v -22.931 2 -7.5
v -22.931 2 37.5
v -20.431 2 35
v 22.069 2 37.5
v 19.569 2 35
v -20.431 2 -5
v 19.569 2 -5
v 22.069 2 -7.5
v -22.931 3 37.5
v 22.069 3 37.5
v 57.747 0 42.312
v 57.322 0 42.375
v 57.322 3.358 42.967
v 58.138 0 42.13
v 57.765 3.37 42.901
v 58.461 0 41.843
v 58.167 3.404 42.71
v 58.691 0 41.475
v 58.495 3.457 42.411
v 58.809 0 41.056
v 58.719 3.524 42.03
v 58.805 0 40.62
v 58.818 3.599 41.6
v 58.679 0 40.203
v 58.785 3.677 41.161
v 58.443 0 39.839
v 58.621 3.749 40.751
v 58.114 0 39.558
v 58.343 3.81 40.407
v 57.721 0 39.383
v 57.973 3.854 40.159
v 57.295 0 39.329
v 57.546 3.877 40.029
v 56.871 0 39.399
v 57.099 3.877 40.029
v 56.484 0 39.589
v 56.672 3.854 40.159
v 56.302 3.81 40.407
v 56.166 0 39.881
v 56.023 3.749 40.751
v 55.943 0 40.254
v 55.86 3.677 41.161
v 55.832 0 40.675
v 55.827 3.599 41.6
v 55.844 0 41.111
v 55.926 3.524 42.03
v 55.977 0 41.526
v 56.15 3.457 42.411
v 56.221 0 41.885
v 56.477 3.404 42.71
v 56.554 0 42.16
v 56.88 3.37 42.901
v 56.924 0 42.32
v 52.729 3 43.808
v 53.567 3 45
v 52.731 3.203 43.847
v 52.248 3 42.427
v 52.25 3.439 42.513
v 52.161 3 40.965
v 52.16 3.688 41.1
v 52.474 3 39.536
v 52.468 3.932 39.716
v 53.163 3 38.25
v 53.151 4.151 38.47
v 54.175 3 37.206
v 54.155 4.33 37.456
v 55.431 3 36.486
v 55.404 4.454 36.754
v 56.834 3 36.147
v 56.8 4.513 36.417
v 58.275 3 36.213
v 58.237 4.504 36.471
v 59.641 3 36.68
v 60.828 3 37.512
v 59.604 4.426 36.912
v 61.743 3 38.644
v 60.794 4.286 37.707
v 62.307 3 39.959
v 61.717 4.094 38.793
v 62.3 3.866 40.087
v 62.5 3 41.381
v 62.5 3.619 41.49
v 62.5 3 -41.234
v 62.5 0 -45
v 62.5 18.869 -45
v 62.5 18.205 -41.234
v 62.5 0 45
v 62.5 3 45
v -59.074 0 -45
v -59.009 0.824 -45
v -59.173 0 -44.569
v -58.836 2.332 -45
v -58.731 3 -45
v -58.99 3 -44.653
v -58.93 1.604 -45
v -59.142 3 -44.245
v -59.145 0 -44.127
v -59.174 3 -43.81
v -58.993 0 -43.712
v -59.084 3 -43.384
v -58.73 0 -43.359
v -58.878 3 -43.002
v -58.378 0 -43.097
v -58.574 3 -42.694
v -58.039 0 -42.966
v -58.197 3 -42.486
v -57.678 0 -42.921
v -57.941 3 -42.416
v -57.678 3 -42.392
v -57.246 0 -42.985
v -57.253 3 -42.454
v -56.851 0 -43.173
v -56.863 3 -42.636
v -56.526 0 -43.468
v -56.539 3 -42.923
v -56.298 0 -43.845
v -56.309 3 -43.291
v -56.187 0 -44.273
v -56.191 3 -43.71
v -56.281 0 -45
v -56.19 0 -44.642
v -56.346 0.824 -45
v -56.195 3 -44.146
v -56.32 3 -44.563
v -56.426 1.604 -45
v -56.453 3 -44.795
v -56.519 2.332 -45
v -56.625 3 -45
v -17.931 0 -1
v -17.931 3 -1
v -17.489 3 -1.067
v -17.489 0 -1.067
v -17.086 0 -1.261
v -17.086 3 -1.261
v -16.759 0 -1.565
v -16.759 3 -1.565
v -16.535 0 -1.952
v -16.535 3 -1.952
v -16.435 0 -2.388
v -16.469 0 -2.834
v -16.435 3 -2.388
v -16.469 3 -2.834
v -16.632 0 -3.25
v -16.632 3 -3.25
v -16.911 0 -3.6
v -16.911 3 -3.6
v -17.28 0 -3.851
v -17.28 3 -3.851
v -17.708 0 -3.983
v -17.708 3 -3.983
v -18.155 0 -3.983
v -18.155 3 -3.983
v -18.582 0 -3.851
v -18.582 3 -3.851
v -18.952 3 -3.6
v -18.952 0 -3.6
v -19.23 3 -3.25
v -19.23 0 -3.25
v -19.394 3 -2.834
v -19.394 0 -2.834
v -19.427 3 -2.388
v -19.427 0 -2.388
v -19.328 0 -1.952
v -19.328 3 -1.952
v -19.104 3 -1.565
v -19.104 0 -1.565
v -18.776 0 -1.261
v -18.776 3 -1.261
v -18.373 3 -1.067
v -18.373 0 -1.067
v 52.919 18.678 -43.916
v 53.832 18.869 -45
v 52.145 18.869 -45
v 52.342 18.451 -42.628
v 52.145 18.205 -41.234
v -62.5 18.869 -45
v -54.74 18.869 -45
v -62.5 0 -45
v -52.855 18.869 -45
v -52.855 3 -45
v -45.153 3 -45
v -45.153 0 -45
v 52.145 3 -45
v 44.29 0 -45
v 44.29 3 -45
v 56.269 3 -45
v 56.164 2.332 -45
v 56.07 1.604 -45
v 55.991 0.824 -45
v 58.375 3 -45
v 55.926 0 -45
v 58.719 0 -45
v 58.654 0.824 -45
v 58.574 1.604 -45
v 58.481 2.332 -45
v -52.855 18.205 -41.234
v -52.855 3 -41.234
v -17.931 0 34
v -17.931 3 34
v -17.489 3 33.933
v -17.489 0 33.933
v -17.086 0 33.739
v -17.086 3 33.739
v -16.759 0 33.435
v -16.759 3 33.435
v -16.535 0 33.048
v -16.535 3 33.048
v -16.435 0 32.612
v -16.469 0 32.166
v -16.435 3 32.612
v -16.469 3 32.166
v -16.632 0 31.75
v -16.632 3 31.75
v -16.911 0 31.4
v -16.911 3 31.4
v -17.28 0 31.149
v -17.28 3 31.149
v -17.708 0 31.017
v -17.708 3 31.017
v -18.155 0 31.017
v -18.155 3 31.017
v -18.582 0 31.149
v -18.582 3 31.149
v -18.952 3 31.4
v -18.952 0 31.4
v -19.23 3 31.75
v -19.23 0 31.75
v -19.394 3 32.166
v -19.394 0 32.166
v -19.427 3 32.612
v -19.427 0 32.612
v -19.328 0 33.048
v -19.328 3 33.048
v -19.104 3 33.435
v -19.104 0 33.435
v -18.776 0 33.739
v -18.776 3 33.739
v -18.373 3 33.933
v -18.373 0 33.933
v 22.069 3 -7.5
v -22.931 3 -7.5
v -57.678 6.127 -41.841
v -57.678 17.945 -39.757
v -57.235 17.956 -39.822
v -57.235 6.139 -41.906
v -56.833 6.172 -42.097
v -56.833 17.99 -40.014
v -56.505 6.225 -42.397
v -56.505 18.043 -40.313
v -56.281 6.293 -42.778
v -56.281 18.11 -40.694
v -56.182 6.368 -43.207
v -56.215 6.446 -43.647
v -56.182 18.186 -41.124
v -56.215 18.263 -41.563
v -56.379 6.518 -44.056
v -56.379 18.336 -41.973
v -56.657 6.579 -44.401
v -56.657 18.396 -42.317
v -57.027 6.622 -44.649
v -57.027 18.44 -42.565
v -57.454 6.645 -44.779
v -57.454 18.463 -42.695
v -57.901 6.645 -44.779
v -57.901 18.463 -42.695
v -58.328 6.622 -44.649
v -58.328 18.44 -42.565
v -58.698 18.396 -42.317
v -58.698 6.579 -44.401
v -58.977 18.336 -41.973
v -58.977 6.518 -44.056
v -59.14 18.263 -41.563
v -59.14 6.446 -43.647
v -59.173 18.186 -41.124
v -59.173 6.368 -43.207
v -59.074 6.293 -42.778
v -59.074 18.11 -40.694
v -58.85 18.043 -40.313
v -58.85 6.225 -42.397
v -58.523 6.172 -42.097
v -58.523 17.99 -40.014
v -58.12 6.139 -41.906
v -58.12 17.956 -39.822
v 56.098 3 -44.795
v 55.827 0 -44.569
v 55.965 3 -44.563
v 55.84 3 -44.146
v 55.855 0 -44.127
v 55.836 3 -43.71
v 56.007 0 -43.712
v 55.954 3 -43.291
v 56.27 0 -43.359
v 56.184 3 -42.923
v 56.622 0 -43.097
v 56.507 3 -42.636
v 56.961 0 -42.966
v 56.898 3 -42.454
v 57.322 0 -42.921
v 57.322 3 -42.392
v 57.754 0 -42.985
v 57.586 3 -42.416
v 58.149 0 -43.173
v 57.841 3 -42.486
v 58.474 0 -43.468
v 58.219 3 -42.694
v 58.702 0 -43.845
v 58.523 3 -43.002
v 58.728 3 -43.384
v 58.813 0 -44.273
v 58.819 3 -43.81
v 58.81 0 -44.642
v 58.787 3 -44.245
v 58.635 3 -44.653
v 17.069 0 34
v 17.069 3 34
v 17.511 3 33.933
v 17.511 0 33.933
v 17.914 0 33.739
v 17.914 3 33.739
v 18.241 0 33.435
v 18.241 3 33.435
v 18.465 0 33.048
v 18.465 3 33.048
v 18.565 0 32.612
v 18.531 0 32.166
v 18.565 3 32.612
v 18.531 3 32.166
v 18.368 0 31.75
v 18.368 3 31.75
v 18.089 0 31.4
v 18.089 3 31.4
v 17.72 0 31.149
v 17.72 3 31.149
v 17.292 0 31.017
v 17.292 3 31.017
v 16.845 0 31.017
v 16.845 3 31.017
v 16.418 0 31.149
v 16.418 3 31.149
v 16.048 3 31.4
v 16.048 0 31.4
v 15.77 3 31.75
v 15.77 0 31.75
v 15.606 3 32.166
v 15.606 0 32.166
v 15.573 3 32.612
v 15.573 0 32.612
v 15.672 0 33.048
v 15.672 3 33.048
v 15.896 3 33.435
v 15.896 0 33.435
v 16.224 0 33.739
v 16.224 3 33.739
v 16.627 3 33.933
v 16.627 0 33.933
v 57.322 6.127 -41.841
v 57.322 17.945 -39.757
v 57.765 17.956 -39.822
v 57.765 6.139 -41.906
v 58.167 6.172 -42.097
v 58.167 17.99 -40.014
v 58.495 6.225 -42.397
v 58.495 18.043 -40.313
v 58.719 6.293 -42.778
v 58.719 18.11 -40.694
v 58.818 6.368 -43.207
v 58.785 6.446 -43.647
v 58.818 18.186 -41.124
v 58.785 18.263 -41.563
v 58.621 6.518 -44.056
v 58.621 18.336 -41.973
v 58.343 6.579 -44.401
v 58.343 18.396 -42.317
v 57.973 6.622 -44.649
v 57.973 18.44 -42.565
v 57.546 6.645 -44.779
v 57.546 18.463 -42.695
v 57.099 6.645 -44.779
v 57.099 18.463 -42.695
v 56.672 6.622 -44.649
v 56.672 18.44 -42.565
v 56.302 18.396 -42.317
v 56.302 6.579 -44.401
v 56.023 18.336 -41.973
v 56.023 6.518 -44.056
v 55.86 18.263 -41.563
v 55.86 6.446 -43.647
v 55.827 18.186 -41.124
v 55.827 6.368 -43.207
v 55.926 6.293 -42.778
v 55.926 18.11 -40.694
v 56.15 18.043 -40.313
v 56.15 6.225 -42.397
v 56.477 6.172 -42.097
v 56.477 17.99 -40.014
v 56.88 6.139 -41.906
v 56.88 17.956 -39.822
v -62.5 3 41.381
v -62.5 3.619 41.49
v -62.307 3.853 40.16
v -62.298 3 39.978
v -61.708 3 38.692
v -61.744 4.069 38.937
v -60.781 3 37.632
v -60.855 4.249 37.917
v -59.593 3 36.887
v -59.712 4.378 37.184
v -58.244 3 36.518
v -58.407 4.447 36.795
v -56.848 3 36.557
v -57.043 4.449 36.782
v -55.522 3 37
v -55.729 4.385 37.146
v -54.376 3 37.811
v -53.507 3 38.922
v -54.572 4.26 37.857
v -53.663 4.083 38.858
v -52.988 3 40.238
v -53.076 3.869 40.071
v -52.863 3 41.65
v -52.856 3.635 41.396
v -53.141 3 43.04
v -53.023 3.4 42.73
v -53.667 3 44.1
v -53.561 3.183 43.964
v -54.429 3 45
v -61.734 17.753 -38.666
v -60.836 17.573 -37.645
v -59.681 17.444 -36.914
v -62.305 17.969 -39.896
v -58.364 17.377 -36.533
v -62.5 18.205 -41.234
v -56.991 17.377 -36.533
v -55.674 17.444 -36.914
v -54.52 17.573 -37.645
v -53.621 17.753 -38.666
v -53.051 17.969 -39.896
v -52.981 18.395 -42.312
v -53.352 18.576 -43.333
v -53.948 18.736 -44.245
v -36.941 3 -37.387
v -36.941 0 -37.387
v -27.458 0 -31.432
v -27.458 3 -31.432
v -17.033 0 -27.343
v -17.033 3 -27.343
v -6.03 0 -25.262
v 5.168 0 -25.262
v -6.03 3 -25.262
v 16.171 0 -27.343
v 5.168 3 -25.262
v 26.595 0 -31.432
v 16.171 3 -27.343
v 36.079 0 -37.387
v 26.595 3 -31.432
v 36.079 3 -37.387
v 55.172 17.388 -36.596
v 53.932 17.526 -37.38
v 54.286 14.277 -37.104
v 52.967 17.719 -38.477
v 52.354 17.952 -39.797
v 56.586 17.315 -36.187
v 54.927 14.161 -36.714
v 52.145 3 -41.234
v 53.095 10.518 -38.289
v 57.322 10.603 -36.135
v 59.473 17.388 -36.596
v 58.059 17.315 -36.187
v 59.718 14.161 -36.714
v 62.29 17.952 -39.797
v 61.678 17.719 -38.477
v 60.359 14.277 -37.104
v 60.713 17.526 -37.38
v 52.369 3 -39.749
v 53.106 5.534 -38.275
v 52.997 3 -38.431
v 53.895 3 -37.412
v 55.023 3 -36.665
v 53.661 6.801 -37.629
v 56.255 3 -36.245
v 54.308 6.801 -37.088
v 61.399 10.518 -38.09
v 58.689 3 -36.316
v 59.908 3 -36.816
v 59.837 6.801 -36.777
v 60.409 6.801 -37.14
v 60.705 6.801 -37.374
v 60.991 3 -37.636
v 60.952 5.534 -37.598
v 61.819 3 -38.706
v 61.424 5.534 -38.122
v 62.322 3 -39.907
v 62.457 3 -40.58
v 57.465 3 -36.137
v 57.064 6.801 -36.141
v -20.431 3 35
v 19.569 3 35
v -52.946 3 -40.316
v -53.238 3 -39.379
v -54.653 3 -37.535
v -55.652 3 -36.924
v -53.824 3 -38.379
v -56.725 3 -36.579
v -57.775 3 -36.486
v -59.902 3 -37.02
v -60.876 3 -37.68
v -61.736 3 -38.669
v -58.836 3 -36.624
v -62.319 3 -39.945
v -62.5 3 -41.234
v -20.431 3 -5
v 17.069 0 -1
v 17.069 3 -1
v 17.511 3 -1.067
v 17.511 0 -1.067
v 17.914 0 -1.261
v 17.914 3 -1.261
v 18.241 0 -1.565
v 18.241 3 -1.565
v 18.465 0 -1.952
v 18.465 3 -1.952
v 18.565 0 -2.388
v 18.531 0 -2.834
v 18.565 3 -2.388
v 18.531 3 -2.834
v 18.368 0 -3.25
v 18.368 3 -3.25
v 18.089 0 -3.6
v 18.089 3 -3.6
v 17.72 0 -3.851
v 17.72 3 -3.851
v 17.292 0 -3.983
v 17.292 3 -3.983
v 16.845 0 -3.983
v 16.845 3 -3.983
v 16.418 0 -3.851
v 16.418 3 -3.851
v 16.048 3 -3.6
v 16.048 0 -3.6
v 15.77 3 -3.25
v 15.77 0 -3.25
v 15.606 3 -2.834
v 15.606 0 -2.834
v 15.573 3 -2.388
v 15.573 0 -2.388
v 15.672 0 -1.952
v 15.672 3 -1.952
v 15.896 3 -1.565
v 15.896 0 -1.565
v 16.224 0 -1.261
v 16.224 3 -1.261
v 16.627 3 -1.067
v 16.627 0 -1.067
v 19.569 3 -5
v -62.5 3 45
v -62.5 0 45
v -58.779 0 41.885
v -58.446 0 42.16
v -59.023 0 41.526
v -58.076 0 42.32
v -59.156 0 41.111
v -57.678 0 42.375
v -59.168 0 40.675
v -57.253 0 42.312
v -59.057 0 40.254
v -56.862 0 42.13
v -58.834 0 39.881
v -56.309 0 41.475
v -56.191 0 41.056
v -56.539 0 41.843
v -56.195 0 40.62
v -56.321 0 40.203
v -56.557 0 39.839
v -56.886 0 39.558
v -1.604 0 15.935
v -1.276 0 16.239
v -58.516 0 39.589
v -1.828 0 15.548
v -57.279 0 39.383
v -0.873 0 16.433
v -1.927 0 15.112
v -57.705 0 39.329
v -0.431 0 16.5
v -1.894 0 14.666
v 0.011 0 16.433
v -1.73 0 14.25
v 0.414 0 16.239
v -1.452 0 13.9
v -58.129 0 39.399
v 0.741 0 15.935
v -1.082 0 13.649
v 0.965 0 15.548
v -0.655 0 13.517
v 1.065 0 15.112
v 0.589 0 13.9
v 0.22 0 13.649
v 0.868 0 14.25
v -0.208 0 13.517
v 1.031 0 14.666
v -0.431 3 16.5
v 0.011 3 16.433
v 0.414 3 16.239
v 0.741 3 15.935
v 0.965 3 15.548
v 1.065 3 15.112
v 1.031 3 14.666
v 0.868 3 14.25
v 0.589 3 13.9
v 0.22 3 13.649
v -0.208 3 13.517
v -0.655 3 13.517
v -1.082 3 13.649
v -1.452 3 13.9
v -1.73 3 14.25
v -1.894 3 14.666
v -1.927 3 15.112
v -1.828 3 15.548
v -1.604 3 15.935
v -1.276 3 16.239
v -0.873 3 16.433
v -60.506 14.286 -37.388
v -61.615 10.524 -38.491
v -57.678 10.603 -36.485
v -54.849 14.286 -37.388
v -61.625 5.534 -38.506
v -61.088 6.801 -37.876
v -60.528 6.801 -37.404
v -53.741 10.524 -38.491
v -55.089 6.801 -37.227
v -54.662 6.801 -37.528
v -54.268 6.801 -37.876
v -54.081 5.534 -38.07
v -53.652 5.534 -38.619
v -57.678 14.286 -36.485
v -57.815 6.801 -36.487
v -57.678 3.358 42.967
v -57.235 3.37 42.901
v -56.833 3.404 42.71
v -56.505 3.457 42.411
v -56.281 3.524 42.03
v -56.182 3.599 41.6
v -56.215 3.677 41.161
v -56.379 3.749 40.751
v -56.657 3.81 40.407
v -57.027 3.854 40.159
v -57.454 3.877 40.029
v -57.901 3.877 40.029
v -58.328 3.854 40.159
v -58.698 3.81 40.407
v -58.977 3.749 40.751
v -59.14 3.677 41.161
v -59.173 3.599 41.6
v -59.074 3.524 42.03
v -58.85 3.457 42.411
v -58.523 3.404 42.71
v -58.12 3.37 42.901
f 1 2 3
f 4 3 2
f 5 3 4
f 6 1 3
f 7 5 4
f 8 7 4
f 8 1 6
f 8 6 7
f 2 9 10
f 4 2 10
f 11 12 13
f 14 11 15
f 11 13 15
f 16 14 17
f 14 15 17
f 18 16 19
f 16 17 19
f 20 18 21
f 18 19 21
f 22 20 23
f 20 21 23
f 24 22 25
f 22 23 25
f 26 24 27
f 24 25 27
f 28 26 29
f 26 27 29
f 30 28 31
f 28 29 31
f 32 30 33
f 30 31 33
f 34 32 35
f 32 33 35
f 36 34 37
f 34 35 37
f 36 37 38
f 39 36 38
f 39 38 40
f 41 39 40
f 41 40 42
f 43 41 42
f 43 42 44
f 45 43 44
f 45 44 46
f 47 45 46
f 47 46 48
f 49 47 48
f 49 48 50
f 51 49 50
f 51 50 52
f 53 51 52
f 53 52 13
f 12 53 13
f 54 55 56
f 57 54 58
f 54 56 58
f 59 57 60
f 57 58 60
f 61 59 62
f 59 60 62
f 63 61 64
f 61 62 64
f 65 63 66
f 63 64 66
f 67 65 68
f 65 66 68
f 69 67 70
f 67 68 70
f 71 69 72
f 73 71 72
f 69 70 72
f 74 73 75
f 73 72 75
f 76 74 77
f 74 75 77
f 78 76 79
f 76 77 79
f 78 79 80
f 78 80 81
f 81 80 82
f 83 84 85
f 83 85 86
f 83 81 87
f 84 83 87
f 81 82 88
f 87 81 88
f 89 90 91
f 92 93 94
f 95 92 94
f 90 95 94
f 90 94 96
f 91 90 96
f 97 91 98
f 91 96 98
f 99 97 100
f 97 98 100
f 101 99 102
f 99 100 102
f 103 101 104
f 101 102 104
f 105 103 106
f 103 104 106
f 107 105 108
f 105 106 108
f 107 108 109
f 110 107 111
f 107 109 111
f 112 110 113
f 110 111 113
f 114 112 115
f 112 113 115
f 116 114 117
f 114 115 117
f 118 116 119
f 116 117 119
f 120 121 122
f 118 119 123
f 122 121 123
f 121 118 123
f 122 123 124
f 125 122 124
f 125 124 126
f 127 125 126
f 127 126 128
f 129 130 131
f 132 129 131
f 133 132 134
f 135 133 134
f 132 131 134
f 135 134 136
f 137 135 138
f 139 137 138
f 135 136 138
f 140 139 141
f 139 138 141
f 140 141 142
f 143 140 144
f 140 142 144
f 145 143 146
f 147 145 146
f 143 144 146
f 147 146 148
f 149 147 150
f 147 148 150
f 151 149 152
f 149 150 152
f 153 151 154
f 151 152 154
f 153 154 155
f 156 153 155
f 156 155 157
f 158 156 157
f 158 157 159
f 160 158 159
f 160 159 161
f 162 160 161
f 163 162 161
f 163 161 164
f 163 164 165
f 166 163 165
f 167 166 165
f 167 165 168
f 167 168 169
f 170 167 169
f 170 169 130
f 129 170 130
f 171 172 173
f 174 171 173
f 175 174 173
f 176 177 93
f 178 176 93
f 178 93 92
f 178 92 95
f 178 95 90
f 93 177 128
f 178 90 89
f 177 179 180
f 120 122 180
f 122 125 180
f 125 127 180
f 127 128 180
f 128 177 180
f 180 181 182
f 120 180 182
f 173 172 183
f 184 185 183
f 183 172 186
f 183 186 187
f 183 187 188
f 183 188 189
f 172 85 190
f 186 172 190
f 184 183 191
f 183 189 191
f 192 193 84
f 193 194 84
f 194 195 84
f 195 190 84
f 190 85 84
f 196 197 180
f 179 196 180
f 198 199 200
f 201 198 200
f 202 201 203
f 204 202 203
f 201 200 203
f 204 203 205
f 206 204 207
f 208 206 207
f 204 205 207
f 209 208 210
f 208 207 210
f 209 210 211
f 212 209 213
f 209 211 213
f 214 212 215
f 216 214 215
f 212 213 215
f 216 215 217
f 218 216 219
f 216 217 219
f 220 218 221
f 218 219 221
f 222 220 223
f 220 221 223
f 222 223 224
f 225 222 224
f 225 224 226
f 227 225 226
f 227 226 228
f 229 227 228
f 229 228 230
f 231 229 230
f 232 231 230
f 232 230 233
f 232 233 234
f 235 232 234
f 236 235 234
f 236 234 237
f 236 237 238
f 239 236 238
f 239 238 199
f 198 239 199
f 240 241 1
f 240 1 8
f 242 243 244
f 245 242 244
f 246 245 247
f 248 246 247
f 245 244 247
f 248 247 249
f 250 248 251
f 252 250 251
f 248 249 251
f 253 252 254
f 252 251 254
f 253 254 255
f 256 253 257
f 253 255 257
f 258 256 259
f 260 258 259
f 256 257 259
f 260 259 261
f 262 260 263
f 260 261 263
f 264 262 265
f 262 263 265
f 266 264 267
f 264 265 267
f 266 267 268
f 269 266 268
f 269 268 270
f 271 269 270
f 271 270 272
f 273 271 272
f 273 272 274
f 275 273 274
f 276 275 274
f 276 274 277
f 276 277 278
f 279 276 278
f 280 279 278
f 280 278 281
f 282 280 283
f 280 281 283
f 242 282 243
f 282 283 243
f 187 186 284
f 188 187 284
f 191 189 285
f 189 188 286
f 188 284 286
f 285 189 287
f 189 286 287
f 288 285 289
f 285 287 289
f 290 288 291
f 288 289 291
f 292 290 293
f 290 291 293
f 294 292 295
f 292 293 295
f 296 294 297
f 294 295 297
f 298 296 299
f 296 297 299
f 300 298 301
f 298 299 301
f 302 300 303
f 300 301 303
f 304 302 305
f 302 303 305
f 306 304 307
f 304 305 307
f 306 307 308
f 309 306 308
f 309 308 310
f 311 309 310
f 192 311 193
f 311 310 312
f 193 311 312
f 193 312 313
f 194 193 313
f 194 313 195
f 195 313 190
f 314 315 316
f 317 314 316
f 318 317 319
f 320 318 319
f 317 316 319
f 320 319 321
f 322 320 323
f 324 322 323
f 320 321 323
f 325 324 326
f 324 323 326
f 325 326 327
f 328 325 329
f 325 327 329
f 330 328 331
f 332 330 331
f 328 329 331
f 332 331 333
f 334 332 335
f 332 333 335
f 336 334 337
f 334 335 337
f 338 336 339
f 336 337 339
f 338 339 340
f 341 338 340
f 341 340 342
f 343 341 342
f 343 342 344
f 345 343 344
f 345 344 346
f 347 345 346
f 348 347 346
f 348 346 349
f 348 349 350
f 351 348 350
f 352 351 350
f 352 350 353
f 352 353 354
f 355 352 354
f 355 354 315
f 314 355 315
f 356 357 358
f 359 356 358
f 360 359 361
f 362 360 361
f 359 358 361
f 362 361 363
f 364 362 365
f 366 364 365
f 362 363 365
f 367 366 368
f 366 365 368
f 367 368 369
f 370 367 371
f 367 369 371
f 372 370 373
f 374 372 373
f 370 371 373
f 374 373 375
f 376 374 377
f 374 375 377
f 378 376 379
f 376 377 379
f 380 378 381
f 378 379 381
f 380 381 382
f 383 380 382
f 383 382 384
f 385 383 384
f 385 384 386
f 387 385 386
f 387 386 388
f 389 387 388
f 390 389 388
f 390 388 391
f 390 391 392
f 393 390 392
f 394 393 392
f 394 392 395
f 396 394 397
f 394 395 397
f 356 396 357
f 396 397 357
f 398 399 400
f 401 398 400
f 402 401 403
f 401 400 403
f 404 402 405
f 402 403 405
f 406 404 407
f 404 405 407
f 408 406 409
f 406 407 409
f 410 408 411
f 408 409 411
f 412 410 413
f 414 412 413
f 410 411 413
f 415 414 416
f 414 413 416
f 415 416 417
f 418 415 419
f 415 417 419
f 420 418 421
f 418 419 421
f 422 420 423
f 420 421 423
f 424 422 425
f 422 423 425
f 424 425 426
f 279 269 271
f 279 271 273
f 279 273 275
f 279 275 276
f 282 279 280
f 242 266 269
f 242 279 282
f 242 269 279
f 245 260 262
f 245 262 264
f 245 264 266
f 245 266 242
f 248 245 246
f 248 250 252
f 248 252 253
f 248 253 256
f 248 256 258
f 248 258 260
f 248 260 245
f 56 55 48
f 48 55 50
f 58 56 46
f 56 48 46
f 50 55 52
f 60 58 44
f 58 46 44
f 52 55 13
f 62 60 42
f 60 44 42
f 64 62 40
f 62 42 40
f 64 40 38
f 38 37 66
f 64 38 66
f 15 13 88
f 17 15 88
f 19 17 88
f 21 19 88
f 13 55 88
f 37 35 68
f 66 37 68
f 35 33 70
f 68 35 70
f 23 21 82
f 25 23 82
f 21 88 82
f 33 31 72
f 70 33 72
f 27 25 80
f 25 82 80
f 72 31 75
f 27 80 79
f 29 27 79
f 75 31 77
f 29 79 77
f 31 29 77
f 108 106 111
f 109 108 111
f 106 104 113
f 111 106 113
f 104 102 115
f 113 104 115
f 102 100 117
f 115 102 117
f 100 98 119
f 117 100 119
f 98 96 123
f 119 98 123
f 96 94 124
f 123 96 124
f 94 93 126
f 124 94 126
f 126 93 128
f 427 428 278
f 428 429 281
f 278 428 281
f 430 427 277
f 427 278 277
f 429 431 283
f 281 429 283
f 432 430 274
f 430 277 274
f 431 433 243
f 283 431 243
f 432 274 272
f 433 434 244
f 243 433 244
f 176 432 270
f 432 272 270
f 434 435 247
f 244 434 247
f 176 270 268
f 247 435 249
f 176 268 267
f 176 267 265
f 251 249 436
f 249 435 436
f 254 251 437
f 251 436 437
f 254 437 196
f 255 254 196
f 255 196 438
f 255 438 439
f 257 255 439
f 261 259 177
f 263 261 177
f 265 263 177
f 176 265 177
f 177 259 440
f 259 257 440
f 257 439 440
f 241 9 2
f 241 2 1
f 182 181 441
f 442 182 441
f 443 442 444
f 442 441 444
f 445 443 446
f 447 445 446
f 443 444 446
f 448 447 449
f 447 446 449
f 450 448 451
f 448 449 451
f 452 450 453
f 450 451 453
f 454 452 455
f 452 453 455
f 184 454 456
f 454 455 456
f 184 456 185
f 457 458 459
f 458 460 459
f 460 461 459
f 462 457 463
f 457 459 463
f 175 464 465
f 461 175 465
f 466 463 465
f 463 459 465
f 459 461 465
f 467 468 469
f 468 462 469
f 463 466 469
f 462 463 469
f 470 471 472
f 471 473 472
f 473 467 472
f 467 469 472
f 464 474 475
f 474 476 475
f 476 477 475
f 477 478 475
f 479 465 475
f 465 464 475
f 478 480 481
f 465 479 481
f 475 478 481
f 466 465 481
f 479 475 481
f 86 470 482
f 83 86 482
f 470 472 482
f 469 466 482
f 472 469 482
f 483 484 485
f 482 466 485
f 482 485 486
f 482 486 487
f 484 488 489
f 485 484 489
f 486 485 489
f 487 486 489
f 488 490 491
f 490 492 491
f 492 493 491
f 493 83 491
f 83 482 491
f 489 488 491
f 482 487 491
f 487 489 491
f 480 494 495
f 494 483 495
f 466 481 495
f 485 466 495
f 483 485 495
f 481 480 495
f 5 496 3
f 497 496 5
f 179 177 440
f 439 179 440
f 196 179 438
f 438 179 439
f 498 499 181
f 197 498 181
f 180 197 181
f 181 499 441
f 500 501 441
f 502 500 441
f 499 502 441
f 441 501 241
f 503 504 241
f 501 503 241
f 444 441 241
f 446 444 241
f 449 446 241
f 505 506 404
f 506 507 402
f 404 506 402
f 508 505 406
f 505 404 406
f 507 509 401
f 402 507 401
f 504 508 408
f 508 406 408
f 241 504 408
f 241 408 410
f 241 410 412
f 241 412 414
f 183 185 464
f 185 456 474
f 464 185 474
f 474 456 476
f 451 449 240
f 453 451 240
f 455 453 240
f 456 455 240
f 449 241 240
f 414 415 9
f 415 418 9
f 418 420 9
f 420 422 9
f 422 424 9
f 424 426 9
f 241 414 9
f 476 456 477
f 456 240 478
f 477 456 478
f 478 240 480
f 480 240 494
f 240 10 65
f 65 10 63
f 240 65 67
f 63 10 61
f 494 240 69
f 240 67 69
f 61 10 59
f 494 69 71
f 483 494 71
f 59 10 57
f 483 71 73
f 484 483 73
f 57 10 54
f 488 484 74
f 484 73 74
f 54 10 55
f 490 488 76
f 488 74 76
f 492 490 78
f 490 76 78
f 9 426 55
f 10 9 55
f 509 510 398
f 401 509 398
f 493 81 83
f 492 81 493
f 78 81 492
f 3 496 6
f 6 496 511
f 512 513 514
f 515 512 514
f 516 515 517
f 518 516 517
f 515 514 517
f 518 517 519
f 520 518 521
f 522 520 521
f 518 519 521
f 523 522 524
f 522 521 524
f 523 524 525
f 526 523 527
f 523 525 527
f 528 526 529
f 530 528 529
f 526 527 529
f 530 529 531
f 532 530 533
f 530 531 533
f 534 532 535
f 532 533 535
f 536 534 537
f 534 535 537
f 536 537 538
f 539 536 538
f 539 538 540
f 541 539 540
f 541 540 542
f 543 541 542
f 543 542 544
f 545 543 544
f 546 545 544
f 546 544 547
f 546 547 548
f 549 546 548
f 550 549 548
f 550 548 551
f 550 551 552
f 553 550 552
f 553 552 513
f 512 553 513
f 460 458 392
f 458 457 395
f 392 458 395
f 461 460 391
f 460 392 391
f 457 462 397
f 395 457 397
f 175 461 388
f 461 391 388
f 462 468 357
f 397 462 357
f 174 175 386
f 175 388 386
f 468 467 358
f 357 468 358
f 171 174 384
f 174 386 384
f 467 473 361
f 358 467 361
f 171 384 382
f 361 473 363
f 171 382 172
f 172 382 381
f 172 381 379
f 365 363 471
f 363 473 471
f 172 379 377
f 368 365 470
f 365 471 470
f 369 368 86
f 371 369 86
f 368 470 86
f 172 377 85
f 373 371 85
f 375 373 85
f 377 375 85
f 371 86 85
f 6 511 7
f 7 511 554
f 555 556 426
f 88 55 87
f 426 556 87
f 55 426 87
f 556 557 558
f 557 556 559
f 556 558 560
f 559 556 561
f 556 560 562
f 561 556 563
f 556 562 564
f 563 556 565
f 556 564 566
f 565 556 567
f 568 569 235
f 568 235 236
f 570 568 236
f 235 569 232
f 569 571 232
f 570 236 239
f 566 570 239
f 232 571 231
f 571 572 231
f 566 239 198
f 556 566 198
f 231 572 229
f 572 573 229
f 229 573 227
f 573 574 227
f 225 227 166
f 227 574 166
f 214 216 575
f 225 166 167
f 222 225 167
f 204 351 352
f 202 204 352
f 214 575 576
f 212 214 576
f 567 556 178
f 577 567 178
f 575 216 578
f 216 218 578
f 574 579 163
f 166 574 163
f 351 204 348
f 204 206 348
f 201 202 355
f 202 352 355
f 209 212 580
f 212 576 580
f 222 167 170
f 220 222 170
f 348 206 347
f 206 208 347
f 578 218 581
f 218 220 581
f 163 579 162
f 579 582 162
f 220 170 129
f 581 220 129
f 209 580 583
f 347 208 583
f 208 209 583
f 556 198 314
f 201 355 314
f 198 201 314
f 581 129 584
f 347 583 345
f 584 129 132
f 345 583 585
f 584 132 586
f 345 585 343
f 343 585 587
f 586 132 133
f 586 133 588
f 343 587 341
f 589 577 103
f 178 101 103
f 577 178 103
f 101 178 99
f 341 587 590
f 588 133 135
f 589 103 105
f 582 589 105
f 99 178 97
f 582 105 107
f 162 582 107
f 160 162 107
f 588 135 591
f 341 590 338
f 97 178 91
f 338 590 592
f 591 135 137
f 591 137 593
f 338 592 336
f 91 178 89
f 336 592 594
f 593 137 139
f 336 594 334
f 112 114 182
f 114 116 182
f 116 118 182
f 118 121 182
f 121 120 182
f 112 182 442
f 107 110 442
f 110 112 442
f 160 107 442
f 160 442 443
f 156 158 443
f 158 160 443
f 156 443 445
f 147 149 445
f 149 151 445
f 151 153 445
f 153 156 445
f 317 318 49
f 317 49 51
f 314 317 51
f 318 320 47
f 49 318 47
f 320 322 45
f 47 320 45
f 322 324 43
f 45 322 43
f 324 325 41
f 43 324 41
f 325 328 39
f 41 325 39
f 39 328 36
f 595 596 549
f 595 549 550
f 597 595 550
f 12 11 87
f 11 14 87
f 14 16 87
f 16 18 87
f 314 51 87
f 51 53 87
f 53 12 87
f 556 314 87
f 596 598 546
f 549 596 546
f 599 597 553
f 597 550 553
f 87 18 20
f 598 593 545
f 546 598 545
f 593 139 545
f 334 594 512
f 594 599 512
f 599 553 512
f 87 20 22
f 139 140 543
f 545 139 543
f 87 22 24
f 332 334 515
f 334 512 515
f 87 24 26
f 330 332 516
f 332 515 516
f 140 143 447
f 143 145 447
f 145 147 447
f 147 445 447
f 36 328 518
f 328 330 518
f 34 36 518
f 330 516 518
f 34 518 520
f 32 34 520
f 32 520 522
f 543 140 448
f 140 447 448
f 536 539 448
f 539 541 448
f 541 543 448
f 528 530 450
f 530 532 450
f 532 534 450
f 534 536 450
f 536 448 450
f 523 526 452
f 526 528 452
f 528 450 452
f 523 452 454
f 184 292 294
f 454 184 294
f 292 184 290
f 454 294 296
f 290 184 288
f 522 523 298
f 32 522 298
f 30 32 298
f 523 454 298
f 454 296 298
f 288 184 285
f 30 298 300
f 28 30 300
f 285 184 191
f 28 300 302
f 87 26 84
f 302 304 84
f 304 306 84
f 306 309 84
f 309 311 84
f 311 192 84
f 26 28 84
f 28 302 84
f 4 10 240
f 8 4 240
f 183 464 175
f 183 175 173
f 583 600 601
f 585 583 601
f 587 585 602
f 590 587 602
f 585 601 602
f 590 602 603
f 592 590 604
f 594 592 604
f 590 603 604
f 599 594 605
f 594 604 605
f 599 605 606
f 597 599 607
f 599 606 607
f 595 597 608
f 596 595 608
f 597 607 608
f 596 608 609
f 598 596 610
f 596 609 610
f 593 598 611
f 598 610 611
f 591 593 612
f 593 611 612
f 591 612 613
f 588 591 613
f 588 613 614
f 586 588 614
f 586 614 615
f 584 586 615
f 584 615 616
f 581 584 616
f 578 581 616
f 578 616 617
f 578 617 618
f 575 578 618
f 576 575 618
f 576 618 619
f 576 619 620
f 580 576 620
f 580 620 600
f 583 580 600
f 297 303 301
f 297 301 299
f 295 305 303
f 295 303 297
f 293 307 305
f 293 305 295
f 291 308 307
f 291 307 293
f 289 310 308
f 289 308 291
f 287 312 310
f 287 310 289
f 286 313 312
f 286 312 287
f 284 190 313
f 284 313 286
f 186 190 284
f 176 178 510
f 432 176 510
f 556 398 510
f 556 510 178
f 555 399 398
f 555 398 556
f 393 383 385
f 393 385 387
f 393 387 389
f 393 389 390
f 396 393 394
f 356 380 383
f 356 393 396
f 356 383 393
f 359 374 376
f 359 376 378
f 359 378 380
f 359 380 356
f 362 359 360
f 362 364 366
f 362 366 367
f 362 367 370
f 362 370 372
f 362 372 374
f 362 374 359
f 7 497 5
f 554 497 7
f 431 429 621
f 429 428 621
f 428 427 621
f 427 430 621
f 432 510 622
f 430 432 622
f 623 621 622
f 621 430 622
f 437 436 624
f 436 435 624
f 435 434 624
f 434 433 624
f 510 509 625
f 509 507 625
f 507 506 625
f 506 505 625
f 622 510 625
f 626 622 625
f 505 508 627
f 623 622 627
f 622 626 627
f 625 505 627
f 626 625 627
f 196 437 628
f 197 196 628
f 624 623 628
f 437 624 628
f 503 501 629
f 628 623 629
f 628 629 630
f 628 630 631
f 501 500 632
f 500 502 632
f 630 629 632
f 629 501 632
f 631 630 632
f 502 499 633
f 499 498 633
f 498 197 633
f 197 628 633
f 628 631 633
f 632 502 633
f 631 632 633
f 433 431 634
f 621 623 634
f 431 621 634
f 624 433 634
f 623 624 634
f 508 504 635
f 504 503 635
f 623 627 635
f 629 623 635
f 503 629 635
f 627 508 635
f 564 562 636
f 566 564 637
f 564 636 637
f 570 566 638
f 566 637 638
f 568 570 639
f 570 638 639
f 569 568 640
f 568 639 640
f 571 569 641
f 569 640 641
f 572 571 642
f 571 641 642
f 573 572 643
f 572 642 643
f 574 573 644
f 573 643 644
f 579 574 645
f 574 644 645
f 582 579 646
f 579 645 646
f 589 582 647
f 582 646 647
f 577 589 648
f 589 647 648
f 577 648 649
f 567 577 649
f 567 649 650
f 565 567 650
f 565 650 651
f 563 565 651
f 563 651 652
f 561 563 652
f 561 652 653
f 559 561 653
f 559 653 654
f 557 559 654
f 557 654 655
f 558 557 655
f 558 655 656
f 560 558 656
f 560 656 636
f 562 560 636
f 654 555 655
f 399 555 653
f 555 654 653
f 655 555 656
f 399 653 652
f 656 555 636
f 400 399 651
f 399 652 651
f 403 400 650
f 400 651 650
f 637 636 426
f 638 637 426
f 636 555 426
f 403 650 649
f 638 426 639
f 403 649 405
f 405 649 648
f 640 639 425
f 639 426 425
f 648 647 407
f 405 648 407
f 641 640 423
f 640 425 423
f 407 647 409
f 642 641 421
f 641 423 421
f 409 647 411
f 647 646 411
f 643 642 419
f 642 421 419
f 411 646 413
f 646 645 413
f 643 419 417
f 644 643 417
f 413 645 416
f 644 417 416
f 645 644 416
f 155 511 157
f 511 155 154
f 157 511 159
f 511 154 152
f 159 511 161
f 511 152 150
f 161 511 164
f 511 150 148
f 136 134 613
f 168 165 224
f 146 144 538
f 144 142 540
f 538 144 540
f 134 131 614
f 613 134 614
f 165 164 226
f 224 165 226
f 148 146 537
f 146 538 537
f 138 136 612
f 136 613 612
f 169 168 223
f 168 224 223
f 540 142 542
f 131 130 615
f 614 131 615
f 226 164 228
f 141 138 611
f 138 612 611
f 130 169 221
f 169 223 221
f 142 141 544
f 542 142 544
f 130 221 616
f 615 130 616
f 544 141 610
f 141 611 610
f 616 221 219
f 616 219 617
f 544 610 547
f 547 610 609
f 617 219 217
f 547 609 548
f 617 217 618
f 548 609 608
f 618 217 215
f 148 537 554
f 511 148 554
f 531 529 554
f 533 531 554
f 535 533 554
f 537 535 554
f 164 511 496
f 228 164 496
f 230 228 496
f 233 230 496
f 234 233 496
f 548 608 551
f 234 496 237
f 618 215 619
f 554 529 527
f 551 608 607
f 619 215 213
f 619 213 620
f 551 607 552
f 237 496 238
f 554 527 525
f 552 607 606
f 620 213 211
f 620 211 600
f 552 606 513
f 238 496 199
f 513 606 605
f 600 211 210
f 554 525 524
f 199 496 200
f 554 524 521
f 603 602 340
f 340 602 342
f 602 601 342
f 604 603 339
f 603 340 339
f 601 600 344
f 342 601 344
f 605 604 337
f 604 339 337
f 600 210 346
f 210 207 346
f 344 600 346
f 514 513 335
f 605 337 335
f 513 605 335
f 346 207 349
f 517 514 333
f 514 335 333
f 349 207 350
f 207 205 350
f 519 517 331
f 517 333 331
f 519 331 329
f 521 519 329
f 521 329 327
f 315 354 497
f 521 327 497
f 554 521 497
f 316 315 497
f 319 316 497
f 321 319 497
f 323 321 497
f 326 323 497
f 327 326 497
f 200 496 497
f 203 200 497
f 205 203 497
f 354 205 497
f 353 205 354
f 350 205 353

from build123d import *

# Parameters (mm, degrees)
SKETCH_1_W                        = 125
SKETCH_1_H                        = 90
EXTRUDE_1_DEPTH                   = 3
EXTRUDE_2_DEPTH                   = 125
SKETCH_4_R                        = 1.5
CUT_EXTRUDE_1_DEPTH               = 79.83849136
CUT_EXTRUDE_2_REACH               = 83.838
CUT_EXTRUDE_2_OFFSET_FROM_SURFACE = 3
SKETCH_7_R                        = 1.5
CUT_EXTRUDE_3_DEPTH               = 79.632618889
SKETCH_8_W                        = 45
SKETCH_8_H                        = 45
SKETCH_8_W_2                      = 40
SKETCH_8_H_2                      = 40
CUT_EXTRUDE_4_DEPTH               = 1
EXTRUDE_5_REACH                   = 80.633
SKETCH_13_R                       = 1.5
CUT_EXTRUDE_6_DEPTH               = 12
SKETCH_14_R                       = 60
CUT_EXTRUDE_11_DEPTH              = 10


with BuildPart() as part:
    # 草图1 → 凸台-拉伸1 (new body)
    with BuildSketch(Plane(origin=(0, 0, 0), x_dir=(1, 0, 0), z_dir=(0, 1, 0))):
        Rectangle(SKETCH_1_W, SKETCH_1_H)
    extrude(amount=EXTRUDE_1_DEPTH)

    # 草图3 → 凸台-拉伸2 (add)
    with BuildSketch(Plane(origin=(62.5, 0, 0), x_dir=(0, 0, -1), z_dir=(1, 0, 0))):
        Polygon((-45, 3), (45, 18.869428264), (45, 3), align=None)
    extrude(amount=-EXTRUDE_2_DEPTH)

    # 草图4 → 切除-拉伸1 (cut, through all)
    with BuildSketch(Plane(origin=(0, 10.604992156, 1.869946247), x_dir=(1, 0, 0), z_dir=(0, 0.9848077530122079, 0.1736481776669313))):
        with Locations(Location((-57.677629218, 43.768927189, 0), (0, 0, 270))):
            Circle(SKETCH_4_R)
        with Locations(Location((-57.677629218, -40.231072811, 0), (0, 0, 270))):
            Circle(SKETCH_4_R)
        with Locations(Location((57.322370782, -40.231072811, 0), (0, 0, 270))):
            Circle(SKETCH_4_R)
        with Locations(Location((57.322370782, 43.768927189, 0), (0, 0, 270))):
            Circle(SKETCH_4_R)
    extrude(amount=-CUT_EXTRUDE_1_DEPTH, mode=Mode.SUBTRACT)

    # 切除-拉伸2: up to this face of the body (flat: up to its plane, moved by the offset)
    cut_extrude_2_end = Plane(part.part.faces().sort_by_distance((0.00039232, 0, -0.011252097))[0]).offset(-CUT_EXTRUDE_2_OFFSET_FROM_SURFACE)
    # 草图6 → 切除-拉伸2 (cut, up to the picked face)
    with BuildSketch(Plane(origin=(0, 10.604992156, 1.869946247), x_dir=(1, 0, 0), z_dir=(0, 0.9848077530122079, 0.1736481776669313)), mode=Mode.PRIVATE) as cut_extrude_2_sk1:
        with BuildLine():
            Line((-62.5, 43.768927189), (-62.5, -40.231072811))
            ThreePointArc((-62.5, -40.231072811), (-55.729394488, -35.819764457), (-54.429429622, -43.795404353))
            Line((-54.429429622, -43.795404353), (53.566923407, -43.795404353))
            ThreePointArc((53.566923407, -43.795404353), (55.403578158, -35.422114588), (62.5, -40.231072811))
            Line((62.5, -40.231072811), (62.5, 43.768927189))
            ThreePointArc((62.5, 43.768927189), (55.232545192, 39.031789517), (53.831757304, 47.592990717))
            Line((53.831757304, 47.592990717), (-54.739637032, 47.592990717))
            ThreePointArc((-54.739637032, 47.592990717), (-55.54606028, 39.44322796), (-62.5, 43.768927189))
        make_face()
    cut_extrude_2_tool1 = split(extrude(cut_extrude_2_sk1.sketch, amount=-CUT_EXTRUDE_2_REACH, mode=Mode.PRIVATE), bisect_by=cut_extrude_2_end, keep=Keep.BOTH, mode=Mode.PRIVATE)
    add(cut_extrude_2_tool1.solids().sort_by(Axis((-0.081778, 10.93222, 0.014148), (0, -0.9848077530122079, -0.1736481776669313)))[0], mode=Mode.SUBTRACT)

    # 草图7 → 切除-拉伸3 (cut, through all)
    with BuildSketch(Plane(origin=(0, 3, 0), x_dir=(1, 0, 0), z_dir=(0, 1, 0))):
        with Locations(Location((-17.931253107, 2.5, 0), (0, 0, 270))):
            Circle(SKETCH_7_R)
        with Locations(Location((-17.931253107, -32.5, 0), (0, 0, 270))):
            Circle(SKETCH_7_R)
        with Locations(Location((17.068746893, 2.5, 0), (0, 0, 270))):
            Circle(SKETCH_7_R)
        with Locations(Location((17.068746893, -32.5, 0), (0, 0, 270))):
            Circle(SKETCH_7_R)
        with Locations(Location((-0.431253107, -15, 0), (0, 0, 270))):
            Circle(SKETCH_7_R)
    extrude(amount=-CUT_EXTRUDE_3_DEPTH, mode=Mode.SUBTRACT)

    # 草图8 → 切除-拉伸4 (cut)
    with BuildSketch(Plane(origin=(0, 3, 0), x_dir=(1, 0, 0), z_dir=(0, 1, 0))):
        with Locations((-0.431253107, -15)):
            Rectangle(SKETCH_8_W, SKETCH_8_H)
        with Locations((-0.431253107, -15)):
            Rectangle(SKETCH_8_W_2, SKETCH_8_H_2, mode=Mode.SUBTRACT)
    extrude(amount=-CUT_EXTRUDE_4_DEPTH, mode=Mode.SUBTRACT)

    # 凸台-拉伸5: up to this plane
    extrude_5_end = Plane(origin=(-153.88839507, 3, 45), z_dir=(0, 0.984807753012208, 0.17364817766693127))
    # 草图10 → 凸台-拉伸5 (add, up to the surface)
    with BuildSketch(Plane(origin=(0, 3, 0), x_dir=(1, 0, 0), z_dir=(0, 1, 0)), mode=Mode.PRIVATE) as extrude_5_sk1:
        with BuildLine():
            Line((-52.855258436, 41.234032589), (-52.855258436, 45))
            Line((-52.855258436, 45), (-62.5, 45))
            Line((-62.5, 45), (-62.5, 41.234032589))
            add(Edge.make_bspline(
                [(-62.5, 41.234032589), (-62.5, 36.484924456), (-57.677629218, 36.484924456), (-52.855258436, 36.484924456), (-52.855258436, 41.234032589)],
                knots=[3.141592654, 3.141592654, 3.141592654, 4.71238898, 4.71238898, 6.283185307, 6.283185307, 6.283185307], degree=2, weights=[1, 0.707106781, 1, 0.707106781, 1]))
        make_face()
    extrude_5_tool1 = split(extrude(extrude_5_sk1.sketch, amount=EXTRUDE_5_REACH, mode=Mode.PRIVATE), bisect_by=extrude_5_end, keep=Keep.BOTH, mode=Mode.PRIVATE)
    add(extrude_5_tool1.solids().sort_by_distance((-57.677629, 3, -41.177434))[0])
    # 草图10 → 凸台-拉伸5 (add, up to the surface)
    with BuildSketch(Plane(origin=(0, 3, 0), x_dir=(1, 0, 0), z_dir=(0, 1, 0)), mode=Mode.PRIVATE) as extrude_5_sk2:
        with BuildLine():
            Line((52.144741564, 41.234032589), (52.144741564, 45))
            Line((52.144741564, 45), (62.5, 45))
            Line((62.5, 45), (62.5, 41.234032589))
            add(Edge.make_bspline(
                [(52.144741564, 41.234032589), (52.144741564, 36.135063193), (57.322370782, 36.135063193), (62.5, 36.135063193), (62.5, 41.234032589)],
                knots=[3.141592654, 3.141592654, 3.141592654, 4.71238898, 4.71238898, 6.283185307, 6.283185307, 6.283185307], degree=2, weights=[1, 0.707106781, 1, 0.707106781, 1]))
        make_face()
    extrude_5_tool2 = split(extrude(extrude_5_sk2.sketch, amount=EXTRUDE_5_REACH, mode=Mode.PRIVATE), bisect_by=extrude_5_end, keep=Keep.BOTH, mode=Mode.PRIVATE)
    add(extrude_5_tool2.solids().sort_by_distance((57.322371, 3, -41.031678))[0])

    # 草图13 → 切除-拉伸6 (cut)
    with BuildSketch(Plane(origin=(0, 10.604992156, 1.869946247), x_dir=(1, 0, 0), z_dir=(0, 0.9848077530122079, 0.1736481776669313))):
        with Locations(Location((-57.677629218, 43.768927189, 0), (0, 0, 270))):
            Circle(SKETCH_13_R)
        with Locations(Location((57.322370782, 43.768927189, 0), (0, 0, 270))):
            Circle(SKETCH_13_R)
    extrude(amount=-CUT_EXTRUDE_6_DEPTH, mode=Mode.SUBTRACT)

    # 草图14 → 切除-拉伸11 (cut)
    with BuildSketch(Plane(origin=(0, 3, 0), x_dir=(1, 0, 0), z_dir=(0, 1, 0))):
        with Locations((-0.431253107, 85)):
            Circle(SKETCH_14_R)
    extrude(amount=-CUT_EXTRUDE_11_DEPTH, mode=Mode.SUBTRACT)


solid = part.part
